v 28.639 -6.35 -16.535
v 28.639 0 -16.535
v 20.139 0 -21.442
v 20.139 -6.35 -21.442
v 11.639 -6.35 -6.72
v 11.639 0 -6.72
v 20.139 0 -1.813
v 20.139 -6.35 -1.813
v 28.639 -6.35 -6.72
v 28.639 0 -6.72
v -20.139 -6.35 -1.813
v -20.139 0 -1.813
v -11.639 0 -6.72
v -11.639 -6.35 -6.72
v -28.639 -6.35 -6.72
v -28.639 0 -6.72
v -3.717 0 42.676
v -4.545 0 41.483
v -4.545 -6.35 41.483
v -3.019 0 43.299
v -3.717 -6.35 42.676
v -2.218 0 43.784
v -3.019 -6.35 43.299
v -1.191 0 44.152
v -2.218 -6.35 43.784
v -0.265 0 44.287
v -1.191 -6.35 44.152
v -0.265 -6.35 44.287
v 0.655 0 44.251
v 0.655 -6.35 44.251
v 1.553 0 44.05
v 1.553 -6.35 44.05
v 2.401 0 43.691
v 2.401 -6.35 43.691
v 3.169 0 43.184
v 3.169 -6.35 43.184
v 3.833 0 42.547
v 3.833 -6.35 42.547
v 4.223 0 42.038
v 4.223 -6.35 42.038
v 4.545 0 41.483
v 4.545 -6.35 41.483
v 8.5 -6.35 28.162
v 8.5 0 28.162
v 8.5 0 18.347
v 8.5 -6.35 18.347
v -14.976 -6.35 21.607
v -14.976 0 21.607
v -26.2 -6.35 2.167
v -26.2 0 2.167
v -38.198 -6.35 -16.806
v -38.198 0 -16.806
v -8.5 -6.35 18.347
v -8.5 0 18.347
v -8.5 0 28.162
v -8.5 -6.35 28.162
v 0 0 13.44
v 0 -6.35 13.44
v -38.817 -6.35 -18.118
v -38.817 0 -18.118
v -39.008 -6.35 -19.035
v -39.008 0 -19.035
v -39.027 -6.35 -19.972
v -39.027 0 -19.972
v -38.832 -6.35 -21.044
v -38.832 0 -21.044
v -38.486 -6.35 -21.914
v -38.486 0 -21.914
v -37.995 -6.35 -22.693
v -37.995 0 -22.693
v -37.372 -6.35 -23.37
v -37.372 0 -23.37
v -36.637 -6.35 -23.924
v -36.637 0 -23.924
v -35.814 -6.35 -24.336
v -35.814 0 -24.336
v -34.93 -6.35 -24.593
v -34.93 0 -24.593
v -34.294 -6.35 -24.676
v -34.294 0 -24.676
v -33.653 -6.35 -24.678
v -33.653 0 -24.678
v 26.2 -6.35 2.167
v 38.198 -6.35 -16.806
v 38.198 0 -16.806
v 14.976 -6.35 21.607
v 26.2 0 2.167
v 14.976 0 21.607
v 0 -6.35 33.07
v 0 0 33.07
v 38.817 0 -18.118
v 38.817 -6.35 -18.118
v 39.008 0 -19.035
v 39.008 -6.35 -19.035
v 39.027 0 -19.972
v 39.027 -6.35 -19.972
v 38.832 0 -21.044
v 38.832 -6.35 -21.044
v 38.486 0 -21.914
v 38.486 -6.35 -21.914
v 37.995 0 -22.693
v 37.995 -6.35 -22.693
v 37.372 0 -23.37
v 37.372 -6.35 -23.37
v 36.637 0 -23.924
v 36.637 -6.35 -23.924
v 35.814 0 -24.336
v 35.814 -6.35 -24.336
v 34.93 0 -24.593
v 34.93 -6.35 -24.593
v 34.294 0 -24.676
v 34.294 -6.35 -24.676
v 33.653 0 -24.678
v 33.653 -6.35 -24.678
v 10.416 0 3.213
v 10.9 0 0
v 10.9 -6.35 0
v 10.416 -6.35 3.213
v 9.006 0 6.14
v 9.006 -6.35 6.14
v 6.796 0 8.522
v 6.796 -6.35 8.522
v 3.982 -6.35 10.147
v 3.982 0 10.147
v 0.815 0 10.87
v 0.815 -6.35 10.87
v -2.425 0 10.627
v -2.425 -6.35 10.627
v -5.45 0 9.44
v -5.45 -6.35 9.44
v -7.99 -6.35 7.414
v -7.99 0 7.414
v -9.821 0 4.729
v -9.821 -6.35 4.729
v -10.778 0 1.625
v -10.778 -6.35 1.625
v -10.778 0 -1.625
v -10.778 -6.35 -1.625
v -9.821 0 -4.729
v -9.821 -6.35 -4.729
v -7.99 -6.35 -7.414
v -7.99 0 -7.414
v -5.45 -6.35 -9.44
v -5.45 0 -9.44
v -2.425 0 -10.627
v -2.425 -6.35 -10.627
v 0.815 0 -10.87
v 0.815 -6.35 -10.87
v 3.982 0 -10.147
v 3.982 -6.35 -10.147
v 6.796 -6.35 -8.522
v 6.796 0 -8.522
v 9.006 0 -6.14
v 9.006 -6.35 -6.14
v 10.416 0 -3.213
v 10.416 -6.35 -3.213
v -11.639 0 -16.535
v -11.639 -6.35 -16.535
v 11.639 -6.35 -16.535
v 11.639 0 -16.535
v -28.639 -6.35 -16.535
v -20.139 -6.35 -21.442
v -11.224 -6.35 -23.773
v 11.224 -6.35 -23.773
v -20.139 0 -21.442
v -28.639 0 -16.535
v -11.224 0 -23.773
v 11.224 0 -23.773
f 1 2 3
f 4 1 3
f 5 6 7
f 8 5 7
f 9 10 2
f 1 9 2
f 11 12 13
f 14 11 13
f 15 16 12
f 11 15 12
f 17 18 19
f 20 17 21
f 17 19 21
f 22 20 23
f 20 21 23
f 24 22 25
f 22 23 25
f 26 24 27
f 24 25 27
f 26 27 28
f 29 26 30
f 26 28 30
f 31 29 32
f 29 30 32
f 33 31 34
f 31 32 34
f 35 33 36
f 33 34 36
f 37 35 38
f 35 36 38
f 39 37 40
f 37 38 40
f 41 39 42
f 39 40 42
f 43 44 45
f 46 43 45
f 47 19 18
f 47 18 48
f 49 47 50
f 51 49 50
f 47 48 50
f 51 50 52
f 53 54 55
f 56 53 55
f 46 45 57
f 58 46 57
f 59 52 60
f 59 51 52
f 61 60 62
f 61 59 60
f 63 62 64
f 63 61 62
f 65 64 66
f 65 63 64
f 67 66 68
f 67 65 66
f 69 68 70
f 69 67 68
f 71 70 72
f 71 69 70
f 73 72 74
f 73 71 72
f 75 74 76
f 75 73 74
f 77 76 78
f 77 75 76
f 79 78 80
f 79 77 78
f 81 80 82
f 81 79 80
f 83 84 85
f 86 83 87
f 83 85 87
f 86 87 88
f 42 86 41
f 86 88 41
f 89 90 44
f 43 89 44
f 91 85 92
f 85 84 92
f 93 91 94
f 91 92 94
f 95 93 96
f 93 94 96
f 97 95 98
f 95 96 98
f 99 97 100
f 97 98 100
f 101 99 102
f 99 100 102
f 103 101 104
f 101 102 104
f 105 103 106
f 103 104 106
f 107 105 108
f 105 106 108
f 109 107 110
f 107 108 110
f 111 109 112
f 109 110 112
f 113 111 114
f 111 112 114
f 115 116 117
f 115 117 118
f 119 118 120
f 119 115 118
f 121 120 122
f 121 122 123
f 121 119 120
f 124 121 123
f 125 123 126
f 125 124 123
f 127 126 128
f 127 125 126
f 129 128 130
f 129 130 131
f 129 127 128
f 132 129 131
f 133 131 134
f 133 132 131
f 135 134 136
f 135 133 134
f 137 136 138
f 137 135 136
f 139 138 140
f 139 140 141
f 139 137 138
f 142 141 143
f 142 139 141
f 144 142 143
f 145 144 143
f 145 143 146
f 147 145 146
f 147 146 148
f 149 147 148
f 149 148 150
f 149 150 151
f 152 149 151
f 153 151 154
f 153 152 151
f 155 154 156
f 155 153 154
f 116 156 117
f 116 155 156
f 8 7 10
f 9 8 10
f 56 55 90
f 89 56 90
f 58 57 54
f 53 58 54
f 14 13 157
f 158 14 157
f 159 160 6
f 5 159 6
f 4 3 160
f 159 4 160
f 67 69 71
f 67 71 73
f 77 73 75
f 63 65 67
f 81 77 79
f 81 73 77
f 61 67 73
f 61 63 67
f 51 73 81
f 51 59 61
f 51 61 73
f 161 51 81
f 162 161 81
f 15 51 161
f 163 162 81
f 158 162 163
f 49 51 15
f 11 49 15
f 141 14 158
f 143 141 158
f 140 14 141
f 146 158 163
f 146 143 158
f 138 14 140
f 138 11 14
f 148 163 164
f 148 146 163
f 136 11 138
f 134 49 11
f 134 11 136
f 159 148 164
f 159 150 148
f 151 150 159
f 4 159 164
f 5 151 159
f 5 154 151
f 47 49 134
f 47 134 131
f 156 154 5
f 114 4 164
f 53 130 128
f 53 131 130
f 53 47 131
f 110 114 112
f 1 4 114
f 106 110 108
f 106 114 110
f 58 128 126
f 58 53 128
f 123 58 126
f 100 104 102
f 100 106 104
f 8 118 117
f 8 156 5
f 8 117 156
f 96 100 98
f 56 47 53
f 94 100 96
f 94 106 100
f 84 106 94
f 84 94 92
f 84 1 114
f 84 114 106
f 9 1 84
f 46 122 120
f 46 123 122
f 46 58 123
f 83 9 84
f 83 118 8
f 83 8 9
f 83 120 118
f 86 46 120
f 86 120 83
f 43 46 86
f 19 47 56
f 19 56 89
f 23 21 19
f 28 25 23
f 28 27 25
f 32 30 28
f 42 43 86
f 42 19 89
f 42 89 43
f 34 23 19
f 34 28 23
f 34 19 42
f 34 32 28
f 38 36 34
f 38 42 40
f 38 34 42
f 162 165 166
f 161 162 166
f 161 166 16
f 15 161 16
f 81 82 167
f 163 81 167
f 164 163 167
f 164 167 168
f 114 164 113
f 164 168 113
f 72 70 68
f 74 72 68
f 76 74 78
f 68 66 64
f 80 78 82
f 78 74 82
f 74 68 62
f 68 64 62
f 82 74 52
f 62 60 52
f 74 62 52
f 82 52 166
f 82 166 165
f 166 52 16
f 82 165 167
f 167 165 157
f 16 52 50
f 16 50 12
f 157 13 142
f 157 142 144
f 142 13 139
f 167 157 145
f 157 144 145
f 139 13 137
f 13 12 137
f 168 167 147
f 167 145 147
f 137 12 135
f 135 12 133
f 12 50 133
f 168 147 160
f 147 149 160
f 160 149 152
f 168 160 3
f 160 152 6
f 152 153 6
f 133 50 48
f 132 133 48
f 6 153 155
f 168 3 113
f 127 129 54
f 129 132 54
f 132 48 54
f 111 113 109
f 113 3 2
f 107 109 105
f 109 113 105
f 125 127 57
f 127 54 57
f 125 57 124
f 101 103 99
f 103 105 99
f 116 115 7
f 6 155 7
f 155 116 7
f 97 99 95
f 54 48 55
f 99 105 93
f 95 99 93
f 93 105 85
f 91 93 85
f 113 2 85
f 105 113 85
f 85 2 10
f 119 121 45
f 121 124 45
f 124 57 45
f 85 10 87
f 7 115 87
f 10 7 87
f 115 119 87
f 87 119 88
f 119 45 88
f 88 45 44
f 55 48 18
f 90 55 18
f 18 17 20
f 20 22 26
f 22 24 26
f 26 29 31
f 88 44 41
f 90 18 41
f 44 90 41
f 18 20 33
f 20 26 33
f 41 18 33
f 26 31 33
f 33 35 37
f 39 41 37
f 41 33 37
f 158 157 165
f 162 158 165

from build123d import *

# Parameters (mm, degrees)
F0_R     = 10.9
F1_DEPTH = 6.35
F2_R     = 5.08


with BuildPart() as f1:
    # F0 (on Front) → F1 (new body)
    with BuildSketch(Plane.XZ):
        with BuildLine():
            ThreePointArc((0, 50.8), (-20.4902984868, 11.8300793471), (-43.9940905122, -25.4))
            ThreePointArc((-43.9940905122, -25.4), (0, -23.6601586942), (43.9940905122, -25.4))
            ThreePointArc((43.9940905122, -25.4), (20.4902984868, 11.8300793471), (0, 50.8))
        make_face()
        Polygon((-11.6393814269, -16.5349545762), (-20.1393814269, -21.4424318643), (-28.6393814269, -16.5349545762), (-28.6393814269, -6.72), (-20.1393814269, -1.8125227119), (-11.6393814269, -6.72), align=None, mode=Mode.SUBTRACT)
        Circle(F0_R, mode=Mode.SUBTRACT)
        Polygon((20.1393814269, -1.8125227119), (28.6393814269, -6.72), (28.6393814269, -16.5349545762), (20.1393814269, -21.4424318643), (11.6393814269, -16.5349545762), (11.6393814269, -6.72), align=None, mode=Mode.SUBTRACT)
        Polygon((0, 13.44), (-8.5, 18.3474772881), (-8.5, 28.1624318643), (0, 33.0699091524), (8.5, 28.1624318643), (8.5, 18.3474772881), align=None, mode=Mode.SUBTRACT)
    extrude(amount=F1_DEPTH)

    # F2
    f2_edges = [f1.edges().sort_by_distance(p)[0] for p in [
        (-43.994091, -3.175, -25.4),
        (43.994091, -3.175, -25.4),
        (0, -3.175, 50.8),
    ]]
    fillet(f2_edges, radius=F2_R)


solid = f1.part
